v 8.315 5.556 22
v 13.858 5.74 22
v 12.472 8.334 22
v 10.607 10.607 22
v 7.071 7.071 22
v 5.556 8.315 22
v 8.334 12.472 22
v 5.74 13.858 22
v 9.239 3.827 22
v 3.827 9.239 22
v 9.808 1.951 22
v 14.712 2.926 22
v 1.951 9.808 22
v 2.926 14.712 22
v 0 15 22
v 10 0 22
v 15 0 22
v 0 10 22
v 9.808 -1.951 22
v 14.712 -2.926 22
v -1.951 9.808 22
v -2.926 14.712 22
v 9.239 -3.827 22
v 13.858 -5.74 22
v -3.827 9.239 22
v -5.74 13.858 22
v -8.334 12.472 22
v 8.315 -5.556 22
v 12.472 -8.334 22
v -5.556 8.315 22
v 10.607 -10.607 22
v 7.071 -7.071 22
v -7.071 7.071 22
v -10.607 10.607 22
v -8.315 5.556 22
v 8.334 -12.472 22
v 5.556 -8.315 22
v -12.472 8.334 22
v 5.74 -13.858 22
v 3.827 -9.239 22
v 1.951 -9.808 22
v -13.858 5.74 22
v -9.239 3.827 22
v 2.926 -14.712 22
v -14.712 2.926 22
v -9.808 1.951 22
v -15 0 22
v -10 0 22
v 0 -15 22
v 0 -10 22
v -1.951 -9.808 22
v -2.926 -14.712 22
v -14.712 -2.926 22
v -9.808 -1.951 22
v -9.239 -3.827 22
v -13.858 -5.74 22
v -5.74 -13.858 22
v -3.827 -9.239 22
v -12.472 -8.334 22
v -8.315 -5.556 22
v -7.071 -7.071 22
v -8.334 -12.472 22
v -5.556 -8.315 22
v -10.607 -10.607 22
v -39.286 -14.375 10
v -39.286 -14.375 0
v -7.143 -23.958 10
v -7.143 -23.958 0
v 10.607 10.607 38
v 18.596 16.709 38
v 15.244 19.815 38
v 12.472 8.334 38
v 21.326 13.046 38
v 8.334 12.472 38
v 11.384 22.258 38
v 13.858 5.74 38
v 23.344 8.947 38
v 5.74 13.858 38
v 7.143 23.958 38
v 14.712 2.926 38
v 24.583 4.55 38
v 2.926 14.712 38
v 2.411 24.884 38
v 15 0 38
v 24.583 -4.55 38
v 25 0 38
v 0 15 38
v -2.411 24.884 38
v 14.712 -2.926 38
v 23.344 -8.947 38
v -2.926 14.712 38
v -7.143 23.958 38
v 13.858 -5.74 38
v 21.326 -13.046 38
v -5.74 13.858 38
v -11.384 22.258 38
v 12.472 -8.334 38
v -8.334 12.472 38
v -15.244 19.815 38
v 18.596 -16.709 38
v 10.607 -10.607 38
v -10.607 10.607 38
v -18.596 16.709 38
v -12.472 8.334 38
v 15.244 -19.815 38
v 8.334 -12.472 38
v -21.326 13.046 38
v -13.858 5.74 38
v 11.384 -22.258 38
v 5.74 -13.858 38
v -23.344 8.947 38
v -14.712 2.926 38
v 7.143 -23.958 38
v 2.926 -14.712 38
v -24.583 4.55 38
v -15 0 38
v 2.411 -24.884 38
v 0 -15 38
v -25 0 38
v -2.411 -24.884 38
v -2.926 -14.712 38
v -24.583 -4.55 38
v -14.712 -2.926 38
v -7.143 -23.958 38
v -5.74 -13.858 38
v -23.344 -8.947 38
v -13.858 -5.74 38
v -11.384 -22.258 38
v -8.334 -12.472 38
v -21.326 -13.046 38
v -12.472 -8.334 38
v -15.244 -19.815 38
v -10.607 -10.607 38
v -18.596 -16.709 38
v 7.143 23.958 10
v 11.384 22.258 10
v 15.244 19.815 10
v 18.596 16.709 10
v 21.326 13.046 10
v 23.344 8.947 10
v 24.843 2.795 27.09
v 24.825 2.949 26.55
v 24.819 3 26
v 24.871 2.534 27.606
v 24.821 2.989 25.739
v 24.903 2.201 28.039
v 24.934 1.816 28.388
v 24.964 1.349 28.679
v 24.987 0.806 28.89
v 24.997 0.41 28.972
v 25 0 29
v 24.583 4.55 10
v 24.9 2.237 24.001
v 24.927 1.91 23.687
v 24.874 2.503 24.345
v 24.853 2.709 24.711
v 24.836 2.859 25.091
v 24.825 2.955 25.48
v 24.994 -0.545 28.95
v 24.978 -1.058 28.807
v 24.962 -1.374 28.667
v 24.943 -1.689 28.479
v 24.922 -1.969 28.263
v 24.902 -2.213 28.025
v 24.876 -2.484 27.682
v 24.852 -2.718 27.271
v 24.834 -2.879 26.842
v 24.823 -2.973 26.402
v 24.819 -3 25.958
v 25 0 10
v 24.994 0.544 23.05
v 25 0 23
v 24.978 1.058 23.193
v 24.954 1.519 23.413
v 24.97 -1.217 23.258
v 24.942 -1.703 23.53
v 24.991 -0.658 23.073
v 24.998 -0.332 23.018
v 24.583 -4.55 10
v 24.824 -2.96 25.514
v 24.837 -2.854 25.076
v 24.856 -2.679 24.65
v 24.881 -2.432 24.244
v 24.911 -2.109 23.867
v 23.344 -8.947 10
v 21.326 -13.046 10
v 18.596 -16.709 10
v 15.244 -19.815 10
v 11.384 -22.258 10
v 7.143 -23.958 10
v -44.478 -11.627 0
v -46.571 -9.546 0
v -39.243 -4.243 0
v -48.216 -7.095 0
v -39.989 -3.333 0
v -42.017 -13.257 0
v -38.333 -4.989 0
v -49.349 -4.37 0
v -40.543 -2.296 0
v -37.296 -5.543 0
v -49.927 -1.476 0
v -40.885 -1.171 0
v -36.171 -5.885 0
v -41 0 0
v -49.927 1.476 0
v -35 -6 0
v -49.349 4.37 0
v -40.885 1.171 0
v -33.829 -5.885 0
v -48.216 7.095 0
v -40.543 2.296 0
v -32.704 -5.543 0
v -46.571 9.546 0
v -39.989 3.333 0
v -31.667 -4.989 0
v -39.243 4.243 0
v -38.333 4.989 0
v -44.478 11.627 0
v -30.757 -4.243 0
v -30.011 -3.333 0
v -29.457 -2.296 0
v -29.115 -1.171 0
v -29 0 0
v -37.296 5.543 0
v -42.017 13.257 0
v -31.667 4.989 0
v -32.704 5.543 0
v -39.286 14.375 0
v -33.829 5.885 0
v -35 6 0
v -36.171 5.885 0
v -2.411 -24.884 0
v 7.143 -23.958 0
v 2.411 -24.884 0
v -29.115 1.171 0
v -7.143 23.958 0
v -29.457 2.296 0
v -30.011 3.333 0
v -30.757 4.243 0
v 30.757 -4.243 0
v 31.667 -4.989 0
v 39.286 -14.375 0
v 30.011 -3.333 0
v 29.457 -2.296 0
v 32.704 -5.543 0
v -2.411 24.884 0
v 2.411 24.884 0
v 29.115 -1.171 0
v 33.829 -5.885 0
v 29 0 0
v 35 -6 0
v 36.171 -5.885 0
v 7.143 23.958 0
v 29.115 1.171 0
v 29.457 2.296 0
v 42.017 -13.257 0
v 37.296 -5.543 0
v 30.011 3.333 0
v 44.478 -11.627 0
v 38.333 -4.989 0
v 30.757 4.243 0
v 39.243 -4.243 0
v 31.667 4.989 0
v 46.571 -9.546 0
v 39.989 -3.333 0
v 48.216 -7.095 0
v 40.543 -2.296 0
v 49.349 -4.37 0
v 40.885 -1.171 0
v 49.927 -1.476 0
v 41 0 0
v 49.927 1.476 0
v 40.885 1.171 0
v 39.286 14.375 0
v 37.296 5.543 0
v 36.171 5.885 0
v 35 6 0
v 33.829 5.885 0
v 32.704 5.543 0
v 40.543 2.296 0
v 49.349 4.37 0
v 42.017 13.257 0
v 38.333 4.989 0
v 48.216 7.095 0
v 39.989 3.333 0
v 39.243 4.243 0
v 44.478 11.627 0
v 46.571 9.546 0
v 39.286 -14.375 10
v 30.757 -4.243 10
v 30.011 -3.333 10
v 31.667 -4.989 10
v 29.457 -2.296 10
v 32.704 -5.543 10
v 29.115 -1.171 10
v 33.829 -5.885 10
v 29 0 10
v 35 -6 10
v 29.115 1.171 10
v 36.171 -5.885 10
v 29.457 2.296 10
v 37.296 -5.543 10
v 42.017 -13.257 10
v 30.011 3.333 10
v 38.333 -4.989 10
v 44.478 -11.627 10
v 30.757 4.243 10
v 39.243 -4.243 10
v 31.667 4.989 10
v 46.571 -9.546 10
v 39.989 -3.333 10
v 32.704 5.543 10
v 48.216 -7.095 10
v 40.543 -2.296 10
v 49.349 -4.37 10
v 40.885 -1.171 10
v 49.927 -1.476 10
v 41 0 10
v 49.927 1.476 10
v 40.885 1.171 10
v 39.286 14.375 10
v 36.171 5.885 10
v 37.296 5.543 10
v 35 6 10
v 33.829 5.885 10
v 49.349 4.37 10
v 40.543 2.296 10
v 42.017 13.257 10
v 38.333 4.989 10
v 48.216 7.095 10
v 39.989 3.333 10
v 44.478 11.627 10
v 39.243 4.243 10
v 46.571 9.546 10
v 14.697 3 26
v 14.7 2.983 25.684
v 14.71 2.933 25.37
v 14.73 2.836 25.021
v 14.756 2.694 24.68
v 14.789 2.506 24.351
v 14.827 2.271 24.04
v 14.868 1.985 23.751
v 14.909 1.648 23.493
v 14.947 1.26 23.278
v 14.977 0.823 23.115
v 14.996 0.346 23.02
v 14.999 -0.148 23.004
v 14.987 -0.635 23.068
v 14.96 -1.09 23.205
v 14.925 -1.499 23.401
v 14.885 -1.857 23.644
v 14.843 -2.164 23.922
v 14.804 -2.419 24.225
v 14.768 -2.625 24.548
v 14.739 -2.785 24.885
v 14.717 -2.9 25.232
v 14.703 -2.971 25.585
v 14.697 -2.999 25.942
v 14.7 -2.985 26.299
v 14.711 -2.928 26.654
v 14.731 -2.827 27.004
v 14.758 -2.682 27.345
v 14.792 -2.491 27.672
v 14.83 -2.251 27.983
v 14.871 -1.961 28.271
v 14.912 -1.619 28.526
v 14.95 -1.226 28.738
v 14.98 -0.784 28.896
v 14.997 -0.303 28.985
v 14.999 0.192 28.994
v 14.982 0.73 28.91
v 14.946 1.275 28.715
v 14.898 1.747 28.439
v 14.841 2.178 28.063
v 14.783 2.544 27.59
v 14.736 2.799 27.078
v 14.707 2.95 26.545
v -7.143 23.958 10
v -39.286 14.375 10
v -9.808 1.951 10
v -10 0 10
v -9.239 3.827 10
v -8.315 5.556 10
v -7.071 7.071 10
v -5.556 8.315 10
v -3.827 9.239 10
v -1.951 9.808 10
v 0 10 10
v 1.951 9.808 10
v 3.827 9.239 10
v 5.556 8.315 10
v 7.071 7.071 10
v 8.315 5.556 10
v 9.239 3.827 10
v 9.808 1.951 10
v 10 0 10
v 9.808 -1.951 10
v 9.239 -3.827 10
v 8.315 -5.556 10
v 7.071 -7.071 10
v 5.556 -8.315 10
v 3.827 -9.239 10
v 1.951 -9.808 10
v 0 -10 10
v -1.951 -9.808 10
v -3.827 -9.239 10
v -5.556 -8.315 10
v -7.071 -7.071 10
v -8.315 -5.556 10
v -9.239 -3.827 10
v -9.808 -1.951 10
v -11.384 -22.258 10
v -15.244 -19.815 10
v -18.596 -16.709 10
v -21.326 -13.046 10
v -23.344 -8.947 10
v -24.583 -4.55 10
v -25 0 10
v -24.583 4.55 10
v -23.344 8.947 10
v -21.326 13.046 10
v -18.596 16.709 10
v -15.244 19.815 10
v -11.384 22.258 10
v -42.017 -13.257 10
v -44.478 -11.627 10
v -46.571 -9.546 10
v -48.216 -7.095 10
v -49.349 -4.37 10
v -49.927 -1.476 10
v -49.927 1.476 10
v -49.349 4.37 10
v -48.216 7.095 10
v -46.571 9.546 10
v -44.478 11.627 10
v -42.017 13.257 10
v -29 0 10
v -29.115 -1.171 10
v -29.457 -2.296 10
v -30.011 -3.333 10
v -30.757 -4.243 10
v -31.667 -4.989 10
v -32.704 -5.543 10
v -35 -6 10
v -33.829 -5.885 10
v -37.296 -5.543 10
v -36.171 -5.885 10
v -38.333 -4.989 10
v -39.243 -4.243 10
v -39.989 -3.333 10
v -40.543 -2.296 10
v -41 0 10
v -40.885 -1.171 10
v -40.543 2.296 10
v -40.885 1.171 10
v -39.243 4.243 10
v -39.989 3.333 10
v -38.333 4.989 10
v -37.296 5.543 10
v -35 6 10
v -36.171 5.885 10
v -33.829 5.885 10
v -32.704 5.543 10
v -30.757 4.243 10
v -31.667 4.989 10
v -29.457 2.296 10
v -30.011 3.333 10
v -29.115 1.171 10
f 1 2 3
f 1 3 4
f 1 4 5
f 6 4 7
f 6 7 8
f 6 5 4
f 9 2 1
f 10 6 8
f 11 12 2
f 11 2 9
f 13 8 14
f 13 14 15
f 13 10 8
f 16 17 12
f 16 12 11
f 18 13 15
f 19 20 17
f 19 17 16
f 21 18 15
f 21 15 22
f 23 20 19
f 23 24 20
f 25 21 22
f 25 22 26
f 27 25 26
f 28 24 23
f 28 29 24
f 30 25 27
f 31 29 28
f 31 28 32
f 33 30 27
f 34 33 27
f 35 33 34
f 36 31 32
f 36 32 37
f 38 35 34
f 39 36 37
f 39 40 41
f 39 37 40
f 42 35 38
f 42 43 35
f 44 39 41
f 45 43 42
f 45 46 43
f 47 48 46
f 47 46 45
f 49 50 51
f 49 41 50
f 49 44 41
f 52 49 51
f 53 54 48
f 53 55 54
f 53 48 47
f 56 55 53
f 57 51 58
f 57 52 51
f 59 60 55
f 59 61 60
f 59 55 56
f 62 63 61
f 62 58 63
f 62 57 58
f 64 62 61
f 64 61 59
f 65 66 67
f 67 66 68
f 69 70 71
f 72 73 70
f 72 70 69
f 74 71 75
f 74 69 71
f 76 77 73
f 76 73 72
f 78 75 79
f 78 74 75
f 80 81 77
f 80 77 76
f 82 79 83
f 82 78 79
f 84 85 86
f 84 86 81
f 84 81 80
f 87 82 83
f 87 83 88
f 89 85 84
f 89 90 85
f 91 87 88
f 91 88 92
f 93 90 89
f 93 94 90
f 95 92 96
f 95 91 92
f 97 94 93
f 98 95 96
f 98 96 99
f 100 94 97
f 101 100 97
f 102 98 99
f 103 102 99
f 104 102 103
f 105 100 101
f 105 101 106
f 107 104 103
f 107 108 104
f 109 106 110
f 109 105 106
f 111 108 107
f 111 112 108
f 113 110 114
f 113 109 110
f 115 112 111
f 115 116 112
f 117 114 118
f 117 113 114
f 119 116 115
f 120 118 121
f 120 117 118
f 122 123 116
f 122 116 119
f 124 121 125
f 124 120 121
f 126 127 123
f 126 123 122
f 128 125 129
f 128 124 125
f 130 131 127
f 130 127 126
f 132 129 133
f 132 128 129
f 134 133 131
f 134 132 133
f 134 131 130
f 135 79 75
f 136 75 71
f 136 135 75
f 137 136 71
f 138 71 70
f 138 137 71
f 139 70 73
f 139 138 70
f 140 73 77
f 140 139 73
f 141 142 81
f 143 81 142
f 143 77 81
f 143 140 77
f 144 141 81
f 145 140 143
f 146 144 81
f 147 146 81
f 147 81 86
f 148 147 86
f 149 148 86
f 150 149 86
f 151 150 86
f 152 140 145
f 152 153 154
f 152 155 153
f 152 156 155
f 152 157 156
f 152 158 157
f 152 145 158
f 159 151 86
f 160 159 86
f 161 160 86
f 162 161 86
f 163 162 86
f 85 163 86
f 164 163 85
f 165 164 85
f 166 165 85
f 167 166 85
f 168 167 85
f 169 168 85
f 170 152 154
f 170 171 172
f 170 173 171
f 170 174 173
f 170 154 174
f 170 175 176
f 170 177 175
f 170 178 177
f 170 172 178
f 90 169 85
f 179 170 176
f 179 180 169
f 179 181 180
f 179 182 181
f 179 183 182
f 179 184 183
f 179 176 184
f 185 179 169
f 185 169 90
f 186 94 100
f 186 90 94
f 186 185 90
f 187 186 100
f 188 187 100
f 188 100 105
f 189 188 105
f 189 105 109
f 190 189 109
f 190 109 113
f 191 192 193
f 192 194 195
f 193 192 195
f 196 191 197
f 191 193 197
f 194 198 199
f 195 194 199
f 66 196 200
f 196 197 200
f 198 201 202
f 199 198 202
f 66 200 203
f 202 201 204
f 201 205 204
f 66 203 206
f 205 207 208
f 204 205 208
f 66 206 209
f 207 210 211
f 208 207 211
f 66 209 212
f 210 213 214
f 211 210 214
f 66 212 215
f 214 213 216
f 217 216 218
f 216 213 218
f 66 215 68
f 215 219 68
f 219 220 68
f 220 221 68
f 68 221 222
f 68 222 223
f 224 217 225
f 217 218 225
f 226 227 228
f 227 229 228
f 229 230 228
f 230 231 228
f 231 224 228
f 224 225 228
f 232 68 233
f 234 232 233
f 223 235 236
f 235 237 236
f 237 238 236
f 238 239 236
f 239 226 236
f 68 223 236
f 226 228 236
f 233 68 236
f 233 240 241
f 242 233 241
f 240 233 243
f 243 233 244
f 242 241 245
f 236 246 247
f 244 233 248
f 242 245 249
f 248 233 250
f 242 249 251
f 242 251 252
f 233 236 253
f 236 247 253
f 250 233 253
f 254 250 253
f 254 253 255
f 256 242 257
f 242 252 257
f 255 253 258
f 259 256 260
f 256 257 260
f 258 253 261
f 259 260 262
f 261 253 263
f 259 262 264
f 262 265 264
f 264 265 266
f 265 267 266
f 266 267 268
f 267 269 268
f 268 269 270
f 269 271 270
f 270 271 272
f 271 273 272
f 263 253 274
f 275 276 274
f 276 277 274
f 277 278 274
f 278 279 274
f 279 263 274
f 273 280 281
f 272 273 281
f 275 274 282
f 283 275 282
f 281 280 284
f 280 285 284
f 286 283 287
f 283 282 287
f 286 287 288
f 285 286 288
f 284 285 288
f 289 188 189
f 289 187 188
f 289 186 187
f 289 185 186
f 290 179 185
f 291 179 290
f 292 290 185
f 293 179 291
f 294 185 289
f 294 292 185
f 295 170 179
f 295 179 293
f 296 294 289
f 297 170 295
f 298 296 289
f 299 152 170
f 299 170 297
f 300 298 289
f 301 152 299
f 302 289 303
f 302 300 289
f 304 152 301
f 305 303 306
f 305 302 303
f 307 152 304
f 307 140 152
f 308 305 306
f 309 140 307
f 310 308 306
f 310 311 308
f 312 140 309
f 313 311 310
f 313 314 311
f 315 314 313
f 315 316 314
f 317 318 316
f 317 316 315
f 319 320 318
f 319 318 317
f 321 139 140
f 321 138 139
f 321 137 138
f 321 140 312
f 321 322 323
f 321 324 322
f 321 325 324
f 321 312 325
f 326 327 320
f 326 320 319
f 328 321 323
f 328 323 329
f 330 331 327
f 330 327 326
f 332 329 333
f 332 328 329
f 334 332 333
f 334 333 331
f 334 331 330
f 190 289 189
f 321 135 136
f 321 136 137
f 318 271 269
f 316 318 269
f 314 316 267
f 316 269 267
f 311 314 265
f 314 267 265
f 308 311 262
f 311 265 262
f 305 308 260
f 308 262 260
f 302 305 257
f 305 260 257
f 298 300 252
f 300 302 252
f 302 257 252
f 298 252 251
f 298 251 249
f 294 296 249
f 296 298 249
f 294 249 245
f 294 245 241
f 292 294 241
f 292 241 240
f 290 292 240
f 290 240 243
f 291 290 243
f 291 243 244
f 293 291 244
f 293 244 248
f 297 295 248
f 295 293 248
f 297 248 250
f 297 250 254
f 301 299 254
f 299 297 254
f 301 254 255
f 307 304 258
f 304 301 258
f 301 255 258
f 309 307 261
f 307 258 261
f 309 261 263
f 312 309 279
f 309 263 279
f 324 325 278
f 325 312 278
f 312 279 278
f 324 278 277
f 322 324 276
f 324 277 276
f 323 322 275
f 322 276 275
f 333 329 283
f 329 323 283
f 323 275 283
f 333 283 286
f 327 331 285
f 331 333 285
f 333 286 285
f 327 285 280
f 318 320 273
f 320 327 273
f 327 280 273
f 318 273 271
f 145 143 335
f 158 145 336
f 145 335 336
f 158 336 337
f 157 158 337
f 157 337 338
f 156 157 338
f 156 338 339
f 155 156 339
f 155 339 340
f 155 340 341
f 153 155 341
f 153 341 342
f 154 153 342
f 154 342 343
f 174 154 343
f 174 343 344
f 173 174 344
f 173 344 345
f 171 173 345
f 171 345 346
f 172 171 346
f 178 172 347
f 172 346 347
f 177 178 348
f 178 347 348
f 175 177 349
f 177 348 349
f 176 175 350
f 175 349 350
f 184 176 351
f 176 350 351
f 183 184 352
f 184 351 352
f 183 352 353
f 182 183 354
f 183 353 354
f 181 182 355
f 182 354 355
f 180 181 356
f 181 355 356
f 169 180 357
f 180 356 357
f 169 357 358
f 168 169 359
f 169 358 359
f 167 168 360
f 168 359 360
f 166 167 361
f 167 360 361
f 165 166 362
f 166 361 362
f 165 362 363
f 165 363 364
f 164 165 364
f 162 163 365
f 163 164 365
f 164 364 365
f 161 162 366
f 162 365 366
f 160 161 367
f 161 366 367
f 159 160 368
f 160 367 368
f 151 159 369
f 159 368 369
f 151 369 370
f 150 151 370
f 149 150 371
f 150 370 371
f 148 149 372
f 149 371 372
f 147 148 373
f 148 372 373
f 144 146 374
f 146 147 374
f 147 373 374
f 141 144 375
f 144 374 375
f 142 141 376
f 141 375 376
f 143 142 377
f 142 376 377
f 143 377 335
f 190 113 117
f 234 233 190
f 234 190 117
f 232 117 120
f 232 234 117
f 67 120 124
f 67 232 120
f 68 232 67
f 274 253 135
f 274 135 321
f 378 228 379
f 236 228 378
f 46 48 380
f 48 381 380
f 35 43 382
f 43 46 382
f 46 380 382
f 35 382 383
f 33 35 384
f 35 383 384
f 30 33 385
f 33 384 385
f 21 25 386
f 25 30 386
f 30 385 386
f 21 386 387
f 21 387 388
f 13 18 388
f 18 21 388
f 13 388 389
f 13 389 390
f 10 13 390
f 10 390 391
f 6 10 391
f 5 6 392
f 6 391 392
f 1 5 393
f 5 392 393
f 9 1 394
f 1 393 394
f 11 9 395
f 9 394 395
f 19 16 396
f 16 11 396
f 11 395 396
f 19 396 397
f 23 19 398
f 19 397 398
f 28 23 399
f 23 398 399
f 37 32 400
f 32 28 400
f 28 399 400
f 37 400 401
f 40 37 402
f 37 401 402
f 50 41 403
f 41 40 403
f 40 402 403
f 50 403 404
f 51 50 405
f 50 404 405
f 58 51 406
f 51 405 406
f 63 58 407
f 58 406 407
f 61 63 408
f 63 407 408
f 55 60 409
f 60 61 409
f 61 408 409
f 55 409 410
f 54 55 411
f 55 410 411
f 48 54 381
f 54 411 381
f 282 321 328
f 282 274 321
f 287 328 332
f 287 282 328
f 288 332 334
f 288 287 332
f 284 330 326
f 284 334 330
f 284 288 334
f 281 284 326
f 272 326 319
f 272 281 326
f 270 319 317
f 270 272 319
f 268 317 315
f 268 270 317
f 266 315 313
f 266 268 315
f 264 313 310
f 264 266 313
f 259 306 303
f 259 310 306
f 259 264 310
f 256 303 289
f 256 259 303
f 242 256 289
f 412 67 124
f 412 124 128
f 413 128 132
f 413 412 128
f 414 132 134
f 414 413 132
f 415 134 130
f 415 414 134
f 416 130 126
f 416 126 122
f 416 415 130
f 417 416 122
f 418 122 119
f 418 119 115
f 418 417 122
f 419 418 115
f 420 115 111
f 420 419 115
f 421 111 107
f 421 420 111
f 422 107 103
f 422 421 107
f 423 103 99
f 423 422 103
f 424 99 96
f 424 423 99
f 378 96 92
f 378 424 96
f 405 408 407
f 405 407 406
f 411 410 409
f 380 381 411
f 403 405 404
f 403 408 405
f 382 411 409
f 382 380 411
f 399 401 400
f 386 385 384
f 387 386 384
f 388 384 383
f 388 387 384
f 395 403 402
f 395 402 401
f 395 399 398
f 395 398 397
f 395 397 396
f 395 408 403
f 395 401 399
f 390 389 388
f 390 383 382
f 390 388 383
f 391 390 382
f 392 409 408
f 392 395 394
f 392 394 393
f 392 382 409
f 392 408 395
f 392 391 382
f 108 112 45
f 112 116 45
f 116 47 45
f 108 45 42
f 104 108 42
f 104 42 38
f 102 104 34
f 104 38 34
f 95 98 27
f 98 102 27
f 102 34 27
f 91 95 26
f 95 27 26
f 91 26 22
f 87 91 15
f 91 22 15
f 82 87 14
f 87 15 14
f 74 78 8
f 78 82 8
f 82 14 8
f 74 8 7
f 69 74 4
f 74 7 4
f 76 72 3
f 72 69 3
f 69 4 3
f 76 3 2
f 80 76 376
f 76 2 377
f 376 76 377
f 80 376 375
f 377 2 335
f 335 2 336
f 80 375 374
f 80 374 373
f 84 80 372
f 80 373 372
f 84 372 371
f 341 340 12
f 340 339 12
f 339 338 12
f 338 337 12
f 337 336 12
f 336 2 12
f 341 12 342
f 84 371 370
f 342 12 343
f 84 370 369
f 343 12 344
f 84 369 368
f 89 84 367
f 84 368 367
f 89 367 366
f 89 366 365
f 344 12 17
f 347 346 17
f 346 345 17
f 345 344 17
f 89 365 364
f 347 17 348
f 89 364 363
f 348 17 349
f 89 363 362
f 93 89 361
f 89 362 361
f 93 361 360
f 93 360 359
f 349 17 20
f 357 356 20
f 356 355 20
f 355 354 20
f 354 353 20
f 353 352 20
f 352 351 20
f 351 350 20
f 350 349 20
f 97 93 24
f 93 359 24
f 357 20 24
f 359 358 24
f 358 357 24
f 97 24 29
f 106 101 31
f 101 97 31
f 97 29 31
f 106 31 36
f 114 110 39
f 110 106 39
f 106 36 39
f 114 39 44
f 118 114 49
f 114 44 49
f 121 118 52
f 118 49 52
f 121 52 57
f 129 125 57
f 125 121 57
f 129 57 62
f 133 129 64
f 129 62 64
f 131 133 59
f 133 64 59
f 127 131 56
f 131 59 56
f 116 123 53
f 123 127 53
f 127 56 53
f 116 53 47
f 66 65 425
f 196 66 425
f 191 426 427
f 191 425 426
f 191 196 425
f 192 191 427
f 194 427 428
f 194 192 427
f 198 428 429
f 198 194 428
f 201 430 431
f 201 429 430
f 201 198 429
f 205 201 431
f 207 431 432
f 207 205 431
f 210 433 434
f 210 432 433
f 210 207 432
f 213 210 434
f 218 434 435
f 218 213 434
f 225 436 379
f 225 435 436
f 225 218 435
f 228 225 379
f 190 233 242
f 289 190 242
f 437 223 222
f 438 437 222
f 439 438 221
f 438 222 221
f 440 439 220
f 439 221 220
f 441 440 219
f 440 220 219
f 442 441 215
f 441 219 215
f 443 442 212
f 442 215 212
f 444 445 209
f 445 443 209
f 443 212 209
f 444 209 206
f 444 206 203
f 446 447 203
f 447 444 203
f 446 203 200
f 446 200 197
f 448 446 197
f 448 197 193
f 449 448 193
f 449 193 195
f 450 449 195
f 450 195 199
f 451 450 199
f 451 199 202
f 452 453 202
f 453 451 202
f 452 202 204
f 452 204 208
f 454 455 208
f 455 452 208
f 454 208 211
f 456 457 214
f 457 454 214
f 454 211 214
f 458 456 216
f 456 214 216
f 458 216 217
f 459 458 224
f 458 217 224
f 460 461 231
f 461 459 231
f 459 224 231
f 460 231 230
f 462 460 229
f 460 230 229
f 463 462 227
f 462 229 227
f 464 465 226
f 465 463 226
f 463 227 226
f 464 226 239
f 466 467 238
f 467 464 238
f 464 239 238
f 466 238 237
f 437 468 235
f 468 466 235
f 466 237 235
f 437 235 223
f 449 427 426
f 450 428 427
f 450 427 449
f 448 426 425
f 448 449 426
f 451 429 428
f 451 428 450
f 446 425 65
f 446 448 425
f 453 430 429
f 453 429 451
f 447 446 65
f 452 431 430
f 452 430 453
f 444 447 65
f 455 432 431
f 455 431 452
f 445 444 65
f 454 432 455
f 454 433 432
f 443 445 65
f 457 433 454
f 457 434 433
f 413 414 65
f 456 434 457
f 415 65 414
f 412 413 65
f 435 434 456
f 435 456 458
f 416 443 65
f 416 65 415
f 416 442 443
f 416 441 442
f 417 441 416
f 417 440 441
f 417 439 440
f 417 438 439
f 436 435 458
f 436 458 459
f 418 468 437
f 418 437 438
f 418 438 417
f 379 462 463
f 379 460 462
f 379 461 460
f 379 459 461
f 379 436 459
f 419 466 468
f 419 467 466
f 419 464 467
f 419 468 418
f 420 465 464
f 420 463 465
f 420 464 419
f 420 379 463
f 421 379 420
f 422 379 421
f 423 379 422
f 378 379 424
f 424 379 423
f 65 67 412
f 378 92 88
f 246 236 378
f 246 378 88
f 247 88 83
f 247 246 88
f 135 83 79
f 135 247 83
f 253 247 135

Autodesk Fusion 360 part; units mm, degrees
sketch "Sketch1" plane through (0, 0, 0) normal (0, 0, 1) x (1, 0, 0)
  circle A0 centre (-35, 0) radius 6
  circle A1 centre (35, 0) radius 6
  line L0 (-39.2857, 14.3747) -> (-7.1429, 23.9579)
  line L1 (-39.2857, -14.3747) -> (-7.1429, -23.9579)
  line L2 (7.1429, 23.9579) -> (39.2857, 14.3747)
  line L3 (7.1429, -23.9579) -> (39.2857, -14.3747)
  arc A2 (39.2857, -14.3747) -> (39.2857, 14.3747) centre (35, 0) ccw
  arc A3 (-39.2857, 14.3747) -> (-39.2857, -14.3747) centre (-35, 0) ccw
  arc A4 (-7.1429, -23.9579) -> (7.1429, -23.9579) centre (0, 0) ccw
  arc A5 (7.1429, 23.9579) -> (-7.1429, 23.9579) centre (0, 0) ccw
  dimension "d3" = 50
  dimension "d4" = 12
  dimension "d5" = 12
  dimension "d6" = 35
  dimension "d7" = 35
  dimension "d8" = 30
  dimension "d9" = 30
extrude "Extrude1" add sketch "Sketch1" along normal blind 10
sketch "Sketch2" plane through (0, 0, 10) normal (0, 0, 1) x (-1, 0, 0)
  circle A0 centre (-35, 0) radius 6
  circle A1 centre (35, 0) radius 6
  arc A2 (39.2857, -14.3747) -> (39.2857, 14.3747) centre (35, 0) ccw
  line L0 (39.2857, 14.3747) -> (7.1429, 23.9579)
  arc A3 (7.1429, 23.9579) -> (-7.1429, 23.9579) centre (0, 0) ccw
  line L1 (-7.1429, 23.9579) -> (-39.2857, 14.3747)
  arc A4 (-39.2857, 14.3747) -> (-39.2857, -14.3747) centre (-35, 0) ccw
  line L2 (-39.2857, -14.3747) -> (-7.1429, -23.9579)
  arc A5 (-7.1429, -23.9579) -> (7.1429, -23.9579) centre (0, 0) ccw
  line L3 (7.1429, -23.9579) -> (39.2857, -14.3747)
  circle A6 centre (0, 0) radius 25
  circle A7 centre (0, 0) radius 15
  circle A8 centre (0, 0) radius 10
  dimension "d12" = 50
  dimension "d13" = 30
  dimension "d14" = 20
extrude "Extrude2" add sketch "Sketch2" along normal blind 28 contours A3 A5 A6
sketch "Sketch3" plane through (0, 0, 10) normal (0, 0, 1) x (-1, 0, 0)
  circle A0 centre (0, 0) radius 15
  circle A1 centre (0, 0) radius 10
  dimension "d17" = 20
extrude "Extrude3" add sketch "Sketch3" along normal blind 12
sketch "Sketch4" plane through (0, 0, 10) normal (0, 0, 1) x (-1, 0, 0)
  circle A0 centre (-35, 0) radius 6
  arc A1 (-7.1429, 23.9579) -> (-7.1429, -23.9579) centre (0, 0) ccw
  line L0 (-7.1429, 23.9579) -> (-39.2857, 14.3747)
  arc A2 (-39.2857, 14.3747) -> (-39.2857, -14.3747) centre (-35, 0) ccw
  line L1 (-39.2857, -14.3747) -> (-7.1429, -23.9579)
sketch "Sketch5" plane through (0, 0, 0) normal (1, 0, 0) x (0, 1, 0)
  circle A0 centre (0, 26) radius 3
  line L0 (25, 38) -> (-25, 38)
  dimension "d20" = 6
  dimension "d21" = 12
extrude "Extrude4" cut sketch "Sketch5" along normal blind 25
sketch "Sketch6" plane through (0, 0, 0) normal (1, 0, 0) x (0, 1, 0)
